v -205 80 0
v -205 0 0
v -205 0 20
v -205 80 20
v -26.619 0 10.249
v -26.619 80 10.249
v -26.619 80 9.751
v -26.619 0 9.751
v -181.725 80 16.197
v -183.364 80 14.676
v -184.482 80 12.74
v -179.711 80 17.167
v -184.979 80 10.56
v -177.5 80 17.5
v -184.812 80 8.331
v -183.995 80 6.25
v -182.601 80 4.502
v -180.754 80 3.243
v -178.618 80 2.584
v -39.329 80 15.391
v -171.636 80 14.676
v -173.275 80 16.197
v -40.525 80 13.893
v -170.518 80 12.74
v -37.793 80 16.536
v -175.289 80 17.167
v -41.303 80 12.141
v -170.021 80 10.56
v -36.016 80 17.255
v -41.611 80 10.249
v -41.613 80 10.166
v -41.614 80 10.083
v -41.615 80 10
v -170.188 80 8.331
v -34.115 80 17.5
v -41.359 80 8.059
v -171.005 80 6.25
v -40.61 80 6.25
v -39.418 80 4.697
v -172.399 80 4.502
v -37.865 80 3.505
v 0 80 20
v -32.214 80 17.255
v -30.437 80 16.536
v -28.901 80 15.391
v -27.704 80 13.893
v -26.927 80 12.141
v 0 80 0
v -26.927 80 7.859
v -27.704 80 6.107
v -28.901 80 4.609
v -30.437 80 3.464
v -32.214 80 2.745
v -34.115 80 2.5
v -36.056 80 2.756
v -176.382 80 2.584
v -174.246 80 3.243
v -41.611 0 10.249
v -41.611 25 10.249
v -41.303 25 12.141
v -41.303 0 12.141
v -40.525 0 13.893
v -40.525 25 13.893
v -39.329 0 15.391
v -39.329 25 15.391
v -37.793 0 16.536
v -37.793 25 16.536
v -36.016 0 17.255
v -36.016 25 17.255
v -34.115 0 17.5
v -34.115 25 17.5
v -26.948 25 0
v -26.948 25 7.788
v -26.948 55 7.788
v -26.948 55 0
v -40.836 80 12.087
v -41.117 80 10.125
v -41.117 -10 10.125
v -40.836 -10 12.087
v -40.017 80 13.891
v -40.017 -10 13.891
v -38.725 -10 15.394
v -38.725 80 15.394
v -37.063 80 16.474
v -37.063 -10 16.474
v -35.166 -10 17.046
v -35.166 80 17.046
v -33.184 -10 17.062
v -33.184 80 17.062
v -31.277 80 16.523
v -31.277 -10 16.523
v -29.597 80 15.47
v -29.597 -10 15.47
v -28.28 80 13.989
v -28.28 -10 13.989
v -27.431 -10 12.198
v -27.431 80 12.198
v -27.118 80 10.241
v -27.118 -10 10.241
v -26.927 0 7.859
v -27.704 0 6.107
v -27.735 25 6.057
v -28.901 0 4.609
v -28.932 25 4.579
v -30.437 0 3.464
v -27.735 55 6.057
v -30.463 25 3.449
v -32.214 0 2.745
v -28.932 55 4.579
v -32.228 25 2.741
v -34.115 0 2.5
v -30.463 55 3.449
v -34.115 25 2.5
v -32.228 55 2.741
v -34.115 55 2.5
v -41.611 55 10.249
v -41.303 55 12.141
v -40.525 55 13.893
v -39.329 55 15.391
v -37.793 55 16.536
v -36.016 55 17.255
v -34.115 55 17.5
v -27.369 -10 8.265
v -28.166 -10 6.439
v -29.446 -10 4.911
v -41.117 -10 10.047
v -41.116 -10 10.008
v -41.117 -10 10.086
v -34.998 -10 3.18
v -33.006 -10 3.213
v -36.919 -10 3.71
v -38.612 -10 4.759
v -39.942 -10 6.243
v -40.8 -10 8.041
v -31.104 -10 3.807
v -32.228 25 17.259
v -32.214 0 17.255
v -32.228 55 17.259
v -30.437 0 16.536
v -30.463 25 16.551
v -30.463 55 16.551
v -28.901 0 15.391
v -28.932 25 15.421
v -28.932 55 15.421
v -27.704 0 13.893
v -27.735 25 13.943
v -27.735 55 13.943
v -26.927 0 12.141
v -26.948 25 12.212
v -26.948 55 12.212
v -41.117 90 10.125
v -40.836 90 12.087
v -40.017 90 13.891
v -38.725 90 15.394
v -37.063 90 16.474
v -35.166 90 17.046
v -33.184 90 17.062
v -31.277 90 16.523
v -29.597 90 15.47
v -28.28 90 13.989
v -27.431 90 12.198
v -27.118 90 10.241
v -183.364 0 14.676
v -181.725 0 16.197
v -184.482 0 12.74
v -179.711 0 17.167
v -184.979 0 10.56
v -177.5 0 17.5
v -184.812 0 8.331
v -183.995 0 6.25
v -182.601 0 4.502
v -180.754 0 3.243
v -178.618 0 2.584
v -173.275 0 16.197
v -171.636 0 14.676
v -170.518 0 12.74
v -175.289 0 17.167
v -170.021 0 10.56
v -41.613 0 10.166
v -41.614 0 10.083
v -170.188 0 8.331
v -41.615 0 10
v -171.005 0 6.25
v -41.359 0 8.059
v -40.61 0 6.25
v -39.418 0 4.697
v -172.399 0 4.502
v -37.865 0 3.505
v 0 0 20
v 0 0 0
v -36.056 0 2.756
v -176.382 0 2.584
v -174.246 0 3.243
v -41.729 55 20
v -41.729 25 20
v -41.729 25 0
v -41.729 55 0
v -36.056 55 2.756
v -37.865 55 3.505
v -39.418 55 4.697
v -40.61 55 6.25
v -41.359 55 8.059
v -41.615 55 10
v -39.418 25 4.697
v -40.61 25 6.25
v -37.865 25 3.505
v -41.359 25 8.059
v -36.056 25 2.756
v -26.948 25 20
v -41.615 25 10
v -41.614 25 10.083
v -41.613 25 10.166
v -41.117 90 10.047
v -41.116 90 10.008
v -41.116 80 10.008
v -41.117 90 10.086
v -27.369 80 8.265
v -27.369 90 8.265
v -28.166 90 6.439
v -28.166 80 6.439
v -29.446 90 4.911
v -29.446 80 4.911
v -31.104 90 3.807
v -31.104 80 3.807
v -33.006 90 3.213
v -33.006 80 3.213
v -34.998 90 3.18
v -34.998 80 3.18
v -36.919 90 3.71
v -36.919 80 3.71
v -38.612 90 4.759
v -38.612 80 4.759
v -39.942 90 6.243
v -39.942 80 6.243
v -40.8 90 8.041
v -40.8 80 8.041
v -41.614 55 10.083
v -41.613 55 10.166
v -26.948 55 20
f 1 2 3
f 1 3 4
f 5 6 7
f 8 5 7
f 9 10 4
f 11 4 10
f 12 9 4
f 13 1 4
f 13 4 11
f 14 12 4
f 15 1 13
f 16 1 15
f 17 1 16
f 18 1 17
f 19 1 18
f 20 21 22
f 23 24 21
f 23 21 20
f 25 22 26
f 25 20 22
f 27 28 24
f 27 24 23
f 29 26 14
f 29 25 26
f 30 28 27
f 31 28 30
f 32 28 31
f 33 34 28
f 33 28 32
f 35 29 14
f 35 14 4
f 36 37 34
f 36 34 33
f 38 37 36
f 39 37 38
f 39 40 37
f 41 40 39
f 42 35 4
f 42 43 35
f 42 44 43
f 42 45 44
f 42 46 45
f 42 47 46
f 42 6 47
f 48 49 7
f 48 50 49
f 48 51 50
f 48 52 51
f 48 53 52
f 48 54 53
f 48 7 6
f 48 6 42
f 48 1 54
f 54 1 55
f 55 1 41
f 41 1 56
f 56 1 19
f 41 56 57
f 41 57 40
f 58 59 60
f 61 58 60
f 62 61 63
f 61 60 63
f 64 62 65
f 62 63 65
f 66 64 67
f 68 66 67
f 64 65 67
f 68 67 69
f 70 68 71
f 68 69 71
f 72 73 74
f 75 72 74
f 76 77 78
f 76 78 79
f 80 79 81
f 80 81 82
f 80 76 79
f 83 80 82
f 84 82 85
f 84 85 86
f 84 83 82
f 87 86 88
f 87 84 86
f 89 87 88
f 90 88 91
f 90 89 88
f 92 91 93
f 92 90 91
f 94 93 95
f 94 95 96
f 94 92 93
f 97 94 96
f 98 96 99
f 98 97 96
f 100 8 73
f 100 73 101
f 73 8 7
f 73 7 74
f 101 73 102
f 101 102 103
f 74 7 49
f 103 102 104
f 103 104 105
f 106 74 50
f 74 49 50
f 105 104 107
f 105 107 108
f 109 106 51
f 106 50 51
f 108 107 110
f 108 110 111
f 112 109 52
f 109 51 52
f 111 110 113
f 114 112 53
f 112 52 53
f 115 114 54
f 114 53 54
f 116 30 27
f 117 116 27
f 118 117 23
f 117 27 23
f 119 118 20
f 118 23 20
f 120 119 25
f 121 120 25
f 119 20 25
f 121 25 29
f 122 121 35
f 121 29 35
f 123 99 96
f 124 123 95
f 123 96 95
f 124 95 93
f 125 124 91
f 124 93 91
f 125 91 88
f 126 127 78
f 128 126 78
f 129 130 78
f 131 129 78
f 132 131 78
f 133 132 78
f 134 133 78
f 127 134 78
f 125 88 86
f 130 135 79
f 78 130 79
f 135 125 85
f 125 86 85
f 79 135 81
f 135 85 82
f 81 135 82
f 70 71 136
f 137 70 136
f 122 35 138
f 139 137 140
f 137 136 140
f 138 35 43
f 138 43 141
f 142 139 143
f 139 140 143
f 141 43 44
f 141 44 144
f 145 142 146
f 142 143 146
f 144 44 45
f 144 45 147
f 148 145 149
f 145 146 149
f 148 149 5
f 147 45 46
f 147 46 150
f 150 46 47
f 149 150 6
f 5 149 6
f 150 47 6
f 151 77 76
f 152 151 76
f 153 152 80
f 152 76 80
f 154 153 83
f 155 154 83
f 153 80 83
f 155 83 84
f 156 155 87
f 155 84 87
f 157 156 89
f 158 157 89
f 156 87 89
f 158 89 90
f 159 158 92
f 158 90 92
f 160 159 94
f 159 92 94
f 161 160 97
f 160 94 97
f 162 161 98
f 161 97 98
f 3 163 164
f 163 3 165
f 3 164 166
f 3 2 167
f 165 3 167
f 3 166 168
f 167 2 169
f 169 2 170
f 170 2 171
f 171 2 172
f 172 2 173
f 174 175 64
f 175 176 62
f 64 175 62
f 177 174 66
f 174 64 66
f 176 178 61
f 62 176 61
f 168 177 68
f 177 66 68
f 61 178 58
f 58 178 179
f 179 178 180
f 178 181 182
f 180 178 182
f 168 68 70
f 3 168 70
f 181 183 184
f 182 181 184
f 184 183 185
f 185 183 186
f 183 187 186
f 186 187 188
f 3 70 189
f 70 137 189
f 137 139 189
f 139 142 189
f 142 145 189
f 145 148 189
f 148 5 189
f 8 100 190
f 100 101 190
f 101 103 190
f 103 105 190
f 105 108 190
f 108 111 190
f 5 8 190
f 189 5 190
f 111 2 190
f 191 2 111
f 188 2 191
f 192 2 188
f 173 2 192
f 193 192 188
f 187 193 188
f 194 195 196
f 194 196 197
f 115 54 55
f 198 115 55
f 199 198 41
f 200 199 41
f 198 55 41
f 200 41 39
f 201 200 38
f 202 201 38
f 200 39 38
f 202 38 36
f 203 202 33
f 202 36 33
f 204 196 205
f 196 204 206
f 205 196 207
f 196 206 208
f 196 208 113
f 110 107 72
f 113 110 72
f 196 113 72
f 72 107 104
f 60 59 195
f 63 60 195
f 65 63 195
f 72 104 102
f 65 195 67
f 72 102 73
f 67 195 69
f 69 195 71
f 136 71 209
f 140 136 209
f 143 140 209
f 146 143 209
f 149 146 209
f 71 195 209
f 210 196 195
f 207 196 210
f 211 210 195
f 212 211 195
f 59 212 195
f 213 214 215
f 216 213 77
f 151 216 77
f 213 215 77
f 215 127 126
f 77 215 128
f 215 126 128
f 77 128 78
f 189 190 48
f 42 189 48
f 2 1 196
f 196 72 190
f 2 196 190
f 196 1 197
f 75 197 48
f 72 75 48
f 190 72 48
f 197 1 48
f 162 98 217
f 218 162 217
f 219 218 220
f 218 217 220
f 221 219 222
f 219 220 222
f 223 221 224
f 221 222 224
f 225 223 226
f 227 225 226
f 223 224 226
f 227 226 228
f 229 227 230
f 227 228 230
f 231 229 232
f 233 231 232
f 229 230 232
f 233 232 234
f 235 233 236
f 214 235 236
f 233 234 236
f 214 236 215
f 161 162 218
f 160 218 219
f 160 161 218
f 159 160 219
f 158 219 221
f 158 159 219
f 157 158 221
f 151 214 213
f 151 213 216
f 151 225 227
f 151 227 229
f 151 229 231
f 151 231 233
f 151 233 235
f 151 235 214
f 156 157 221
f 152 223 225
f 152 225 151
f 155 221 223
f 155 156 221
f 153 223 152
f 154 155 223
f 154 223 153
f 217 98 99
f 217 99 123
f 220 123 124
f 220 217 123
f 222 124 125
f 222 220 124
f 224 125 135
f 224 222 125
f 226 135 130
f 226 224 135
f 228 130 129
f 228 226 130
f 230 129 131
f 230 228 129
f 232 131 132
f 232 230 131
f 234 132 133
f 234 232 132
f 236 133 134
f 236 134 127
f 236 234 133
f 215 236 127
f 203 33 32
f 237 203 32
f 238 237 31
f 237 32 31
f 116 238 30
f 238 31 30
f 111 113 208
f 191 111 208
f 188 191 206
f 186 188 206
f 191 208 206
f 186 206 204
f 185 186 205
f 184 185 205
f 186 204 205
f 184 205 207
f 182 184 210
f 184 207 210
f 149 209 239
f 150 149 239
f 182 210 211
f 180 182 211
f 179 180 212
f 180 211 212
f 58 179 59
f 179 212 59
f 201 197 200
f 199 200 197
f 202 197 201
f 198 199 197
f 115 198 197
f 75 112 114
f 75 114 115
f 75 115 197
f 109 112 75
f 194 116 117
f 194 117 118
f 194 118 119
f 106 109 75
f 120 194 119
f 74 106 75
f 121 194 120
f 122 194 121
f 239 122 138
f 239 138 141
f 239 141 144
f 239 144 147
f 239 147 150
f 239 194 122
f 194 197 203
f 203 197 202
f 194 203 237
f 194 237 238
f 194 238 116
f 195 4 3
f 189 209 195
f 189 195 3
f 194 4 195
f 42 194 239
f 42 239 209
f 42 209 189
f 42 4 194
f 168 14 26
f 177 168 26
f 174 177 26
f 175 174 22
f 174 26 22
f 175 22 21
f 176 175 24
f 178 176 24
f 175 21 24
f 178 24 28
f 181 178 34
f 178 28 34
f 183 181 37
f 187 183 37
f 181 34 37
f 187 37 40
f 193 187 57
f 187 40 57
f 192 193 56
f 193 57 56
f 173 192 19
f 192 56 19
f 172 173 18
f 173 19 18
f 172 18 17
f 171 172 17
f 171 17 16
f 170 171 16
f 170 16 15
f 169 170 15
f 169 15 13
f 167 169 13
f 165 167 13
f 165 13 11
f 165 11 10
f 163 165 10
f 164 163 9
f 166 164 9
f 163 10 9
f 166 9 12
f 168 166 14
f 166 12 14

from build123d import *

# Parameters (mm, degrees)
F0_W     = 205
F0_H     = 80
F1_DEPTH = 20
F3_DEPTH = 80
F4_DEPTH = 80
F5_W     = 14.7805176675
F5_H     = 30
F6_DEPTH = 20
F8_DEPTH = 90
F9_DEPTH = 10


with BuildPart() as f1:
    # F0 (on Top) → F1 (new body)
    with BuildSketch(Plane.XY):
        with Locations((-102.5, 40)):
            Rectangle(F0_W, F0_H)
    extrude(amount=F1_DEPTH)

    # F2 (on face) → F3 (cut)
    with BuildSketch(Plane(origin=(0, 80, 0), x_dir=(-1, 0, 0), z_dir=(0, 1, 0))):
        with BuildLine():
            ThreePointArc((41.614908427, 10), (41.6138713052, 10.1247226994), (41.6107602265, 10.2494109048))
            ThreePointArc((41.6107602265, 10.2494109048), (39.3292836635, 15.3907597696), (34.114908427, 17.5))
            Line((34.114908427, 17.5), (34.114908427, 2.5))
            ThreePointArc((34.114908427, 2.5), (39.4182092859, 4.6966991411), (41.614908427, 10))
        make_face()
        with BuildLine():
            ThreePointArc((26.6190566275, 9.7505890952), (28.9005331905, 4.6092402304), (34.114908427, 2.5))
            Line((34.114908427, 2.5), (34.114908427, 17.5))
            ThreePointArc((34.114908427, 17.5), (28.9005331905, 15.3907597696), (26.6190566275, 10.2494109048))
            Line((26.6190566275, 10.2494109048), (26.6190566275, 9.7505890952))
        make_face()
    extrude(amount=-F3_DEPTH, mode=Mode.SUBTRACT)

    # F2 (on face) → F4 (cut)
    with BuildSketch(Plane(origin=(0, 80, 0), x_dir=(-1, 0, 0), z_dir=(0, 1, 0))):
        with BuildLine():
            Line((177.5, 17.5), (177.5, 2.5))
            ThreePointArc((177.5, 2.5), (182.8033008589, 4.6966991411), (185, 10))
            ThreePointArc((185, 10), (182.8033008589, 15.3033008589), (177.5, 17.5))
        make_face()
        with BuildLine():
            ThreePointArc((177.5, 17.5), (170, 10), (177.5, 2.5))
            Line((177.5, 2.5), (177.5, 17.5))
        make_face()
    extrude(amount=-F4_DEPTH, mode=Mode.SUBTRACT)

    # F5 (on face) → F6 (cut)
    with BuildSketch(Plane.XY.offset(20)):
        with Locations((-34.3386624008, 40)):
            Rectangle(F5_W, F5_H)
    extrude(amount=-F6_DEPTH, mode=Mode.SUBTRACT)


with BuildPart() as f8:
    # F7 (on face) → F8 (new body)
    with BuildSketch(Plane(origin=(0, 80, 0), x_dir=(-1, 0, 0), z_dir=(0, 1, 0))):
        with BuildLine():
            Line((27.1179505076, 10.2411133052), (41.1160145469, 10.0082975996))
            ThreePointArc((41.1160145469, 10.0082975996), (41.116740528, 10.0664995138), (41.1169825272, 10.1247054524))
            ThreePointArc((41.1169825272, 10.1247054524), (34.1751884659, 17.1244634531), (27.1179505076, 10.2411133052))
        make_face()
        with BuildLine():
            ThreePointArc((27.1179505076, 10.2411133052), (34.0005746744, 3.1256734328), (41.1160145469, 10.0082975996))
            Line((41.1160145469, 10.0082975996), (27.1179505076, 10.2411133052))
        make_face()
    extrude(amount=-F8_DEPTH)

    # F9 (add): a face of the model
    f9_faces = [f8.faces().sort_by_distance(p)[0] for p in [
        (-34.1169825272, 80, 10.1247054524),
    ]]
    extrude(f9_faces, amount=F9_DEPTH)


solid = Compound([f1.part, f8.part])
